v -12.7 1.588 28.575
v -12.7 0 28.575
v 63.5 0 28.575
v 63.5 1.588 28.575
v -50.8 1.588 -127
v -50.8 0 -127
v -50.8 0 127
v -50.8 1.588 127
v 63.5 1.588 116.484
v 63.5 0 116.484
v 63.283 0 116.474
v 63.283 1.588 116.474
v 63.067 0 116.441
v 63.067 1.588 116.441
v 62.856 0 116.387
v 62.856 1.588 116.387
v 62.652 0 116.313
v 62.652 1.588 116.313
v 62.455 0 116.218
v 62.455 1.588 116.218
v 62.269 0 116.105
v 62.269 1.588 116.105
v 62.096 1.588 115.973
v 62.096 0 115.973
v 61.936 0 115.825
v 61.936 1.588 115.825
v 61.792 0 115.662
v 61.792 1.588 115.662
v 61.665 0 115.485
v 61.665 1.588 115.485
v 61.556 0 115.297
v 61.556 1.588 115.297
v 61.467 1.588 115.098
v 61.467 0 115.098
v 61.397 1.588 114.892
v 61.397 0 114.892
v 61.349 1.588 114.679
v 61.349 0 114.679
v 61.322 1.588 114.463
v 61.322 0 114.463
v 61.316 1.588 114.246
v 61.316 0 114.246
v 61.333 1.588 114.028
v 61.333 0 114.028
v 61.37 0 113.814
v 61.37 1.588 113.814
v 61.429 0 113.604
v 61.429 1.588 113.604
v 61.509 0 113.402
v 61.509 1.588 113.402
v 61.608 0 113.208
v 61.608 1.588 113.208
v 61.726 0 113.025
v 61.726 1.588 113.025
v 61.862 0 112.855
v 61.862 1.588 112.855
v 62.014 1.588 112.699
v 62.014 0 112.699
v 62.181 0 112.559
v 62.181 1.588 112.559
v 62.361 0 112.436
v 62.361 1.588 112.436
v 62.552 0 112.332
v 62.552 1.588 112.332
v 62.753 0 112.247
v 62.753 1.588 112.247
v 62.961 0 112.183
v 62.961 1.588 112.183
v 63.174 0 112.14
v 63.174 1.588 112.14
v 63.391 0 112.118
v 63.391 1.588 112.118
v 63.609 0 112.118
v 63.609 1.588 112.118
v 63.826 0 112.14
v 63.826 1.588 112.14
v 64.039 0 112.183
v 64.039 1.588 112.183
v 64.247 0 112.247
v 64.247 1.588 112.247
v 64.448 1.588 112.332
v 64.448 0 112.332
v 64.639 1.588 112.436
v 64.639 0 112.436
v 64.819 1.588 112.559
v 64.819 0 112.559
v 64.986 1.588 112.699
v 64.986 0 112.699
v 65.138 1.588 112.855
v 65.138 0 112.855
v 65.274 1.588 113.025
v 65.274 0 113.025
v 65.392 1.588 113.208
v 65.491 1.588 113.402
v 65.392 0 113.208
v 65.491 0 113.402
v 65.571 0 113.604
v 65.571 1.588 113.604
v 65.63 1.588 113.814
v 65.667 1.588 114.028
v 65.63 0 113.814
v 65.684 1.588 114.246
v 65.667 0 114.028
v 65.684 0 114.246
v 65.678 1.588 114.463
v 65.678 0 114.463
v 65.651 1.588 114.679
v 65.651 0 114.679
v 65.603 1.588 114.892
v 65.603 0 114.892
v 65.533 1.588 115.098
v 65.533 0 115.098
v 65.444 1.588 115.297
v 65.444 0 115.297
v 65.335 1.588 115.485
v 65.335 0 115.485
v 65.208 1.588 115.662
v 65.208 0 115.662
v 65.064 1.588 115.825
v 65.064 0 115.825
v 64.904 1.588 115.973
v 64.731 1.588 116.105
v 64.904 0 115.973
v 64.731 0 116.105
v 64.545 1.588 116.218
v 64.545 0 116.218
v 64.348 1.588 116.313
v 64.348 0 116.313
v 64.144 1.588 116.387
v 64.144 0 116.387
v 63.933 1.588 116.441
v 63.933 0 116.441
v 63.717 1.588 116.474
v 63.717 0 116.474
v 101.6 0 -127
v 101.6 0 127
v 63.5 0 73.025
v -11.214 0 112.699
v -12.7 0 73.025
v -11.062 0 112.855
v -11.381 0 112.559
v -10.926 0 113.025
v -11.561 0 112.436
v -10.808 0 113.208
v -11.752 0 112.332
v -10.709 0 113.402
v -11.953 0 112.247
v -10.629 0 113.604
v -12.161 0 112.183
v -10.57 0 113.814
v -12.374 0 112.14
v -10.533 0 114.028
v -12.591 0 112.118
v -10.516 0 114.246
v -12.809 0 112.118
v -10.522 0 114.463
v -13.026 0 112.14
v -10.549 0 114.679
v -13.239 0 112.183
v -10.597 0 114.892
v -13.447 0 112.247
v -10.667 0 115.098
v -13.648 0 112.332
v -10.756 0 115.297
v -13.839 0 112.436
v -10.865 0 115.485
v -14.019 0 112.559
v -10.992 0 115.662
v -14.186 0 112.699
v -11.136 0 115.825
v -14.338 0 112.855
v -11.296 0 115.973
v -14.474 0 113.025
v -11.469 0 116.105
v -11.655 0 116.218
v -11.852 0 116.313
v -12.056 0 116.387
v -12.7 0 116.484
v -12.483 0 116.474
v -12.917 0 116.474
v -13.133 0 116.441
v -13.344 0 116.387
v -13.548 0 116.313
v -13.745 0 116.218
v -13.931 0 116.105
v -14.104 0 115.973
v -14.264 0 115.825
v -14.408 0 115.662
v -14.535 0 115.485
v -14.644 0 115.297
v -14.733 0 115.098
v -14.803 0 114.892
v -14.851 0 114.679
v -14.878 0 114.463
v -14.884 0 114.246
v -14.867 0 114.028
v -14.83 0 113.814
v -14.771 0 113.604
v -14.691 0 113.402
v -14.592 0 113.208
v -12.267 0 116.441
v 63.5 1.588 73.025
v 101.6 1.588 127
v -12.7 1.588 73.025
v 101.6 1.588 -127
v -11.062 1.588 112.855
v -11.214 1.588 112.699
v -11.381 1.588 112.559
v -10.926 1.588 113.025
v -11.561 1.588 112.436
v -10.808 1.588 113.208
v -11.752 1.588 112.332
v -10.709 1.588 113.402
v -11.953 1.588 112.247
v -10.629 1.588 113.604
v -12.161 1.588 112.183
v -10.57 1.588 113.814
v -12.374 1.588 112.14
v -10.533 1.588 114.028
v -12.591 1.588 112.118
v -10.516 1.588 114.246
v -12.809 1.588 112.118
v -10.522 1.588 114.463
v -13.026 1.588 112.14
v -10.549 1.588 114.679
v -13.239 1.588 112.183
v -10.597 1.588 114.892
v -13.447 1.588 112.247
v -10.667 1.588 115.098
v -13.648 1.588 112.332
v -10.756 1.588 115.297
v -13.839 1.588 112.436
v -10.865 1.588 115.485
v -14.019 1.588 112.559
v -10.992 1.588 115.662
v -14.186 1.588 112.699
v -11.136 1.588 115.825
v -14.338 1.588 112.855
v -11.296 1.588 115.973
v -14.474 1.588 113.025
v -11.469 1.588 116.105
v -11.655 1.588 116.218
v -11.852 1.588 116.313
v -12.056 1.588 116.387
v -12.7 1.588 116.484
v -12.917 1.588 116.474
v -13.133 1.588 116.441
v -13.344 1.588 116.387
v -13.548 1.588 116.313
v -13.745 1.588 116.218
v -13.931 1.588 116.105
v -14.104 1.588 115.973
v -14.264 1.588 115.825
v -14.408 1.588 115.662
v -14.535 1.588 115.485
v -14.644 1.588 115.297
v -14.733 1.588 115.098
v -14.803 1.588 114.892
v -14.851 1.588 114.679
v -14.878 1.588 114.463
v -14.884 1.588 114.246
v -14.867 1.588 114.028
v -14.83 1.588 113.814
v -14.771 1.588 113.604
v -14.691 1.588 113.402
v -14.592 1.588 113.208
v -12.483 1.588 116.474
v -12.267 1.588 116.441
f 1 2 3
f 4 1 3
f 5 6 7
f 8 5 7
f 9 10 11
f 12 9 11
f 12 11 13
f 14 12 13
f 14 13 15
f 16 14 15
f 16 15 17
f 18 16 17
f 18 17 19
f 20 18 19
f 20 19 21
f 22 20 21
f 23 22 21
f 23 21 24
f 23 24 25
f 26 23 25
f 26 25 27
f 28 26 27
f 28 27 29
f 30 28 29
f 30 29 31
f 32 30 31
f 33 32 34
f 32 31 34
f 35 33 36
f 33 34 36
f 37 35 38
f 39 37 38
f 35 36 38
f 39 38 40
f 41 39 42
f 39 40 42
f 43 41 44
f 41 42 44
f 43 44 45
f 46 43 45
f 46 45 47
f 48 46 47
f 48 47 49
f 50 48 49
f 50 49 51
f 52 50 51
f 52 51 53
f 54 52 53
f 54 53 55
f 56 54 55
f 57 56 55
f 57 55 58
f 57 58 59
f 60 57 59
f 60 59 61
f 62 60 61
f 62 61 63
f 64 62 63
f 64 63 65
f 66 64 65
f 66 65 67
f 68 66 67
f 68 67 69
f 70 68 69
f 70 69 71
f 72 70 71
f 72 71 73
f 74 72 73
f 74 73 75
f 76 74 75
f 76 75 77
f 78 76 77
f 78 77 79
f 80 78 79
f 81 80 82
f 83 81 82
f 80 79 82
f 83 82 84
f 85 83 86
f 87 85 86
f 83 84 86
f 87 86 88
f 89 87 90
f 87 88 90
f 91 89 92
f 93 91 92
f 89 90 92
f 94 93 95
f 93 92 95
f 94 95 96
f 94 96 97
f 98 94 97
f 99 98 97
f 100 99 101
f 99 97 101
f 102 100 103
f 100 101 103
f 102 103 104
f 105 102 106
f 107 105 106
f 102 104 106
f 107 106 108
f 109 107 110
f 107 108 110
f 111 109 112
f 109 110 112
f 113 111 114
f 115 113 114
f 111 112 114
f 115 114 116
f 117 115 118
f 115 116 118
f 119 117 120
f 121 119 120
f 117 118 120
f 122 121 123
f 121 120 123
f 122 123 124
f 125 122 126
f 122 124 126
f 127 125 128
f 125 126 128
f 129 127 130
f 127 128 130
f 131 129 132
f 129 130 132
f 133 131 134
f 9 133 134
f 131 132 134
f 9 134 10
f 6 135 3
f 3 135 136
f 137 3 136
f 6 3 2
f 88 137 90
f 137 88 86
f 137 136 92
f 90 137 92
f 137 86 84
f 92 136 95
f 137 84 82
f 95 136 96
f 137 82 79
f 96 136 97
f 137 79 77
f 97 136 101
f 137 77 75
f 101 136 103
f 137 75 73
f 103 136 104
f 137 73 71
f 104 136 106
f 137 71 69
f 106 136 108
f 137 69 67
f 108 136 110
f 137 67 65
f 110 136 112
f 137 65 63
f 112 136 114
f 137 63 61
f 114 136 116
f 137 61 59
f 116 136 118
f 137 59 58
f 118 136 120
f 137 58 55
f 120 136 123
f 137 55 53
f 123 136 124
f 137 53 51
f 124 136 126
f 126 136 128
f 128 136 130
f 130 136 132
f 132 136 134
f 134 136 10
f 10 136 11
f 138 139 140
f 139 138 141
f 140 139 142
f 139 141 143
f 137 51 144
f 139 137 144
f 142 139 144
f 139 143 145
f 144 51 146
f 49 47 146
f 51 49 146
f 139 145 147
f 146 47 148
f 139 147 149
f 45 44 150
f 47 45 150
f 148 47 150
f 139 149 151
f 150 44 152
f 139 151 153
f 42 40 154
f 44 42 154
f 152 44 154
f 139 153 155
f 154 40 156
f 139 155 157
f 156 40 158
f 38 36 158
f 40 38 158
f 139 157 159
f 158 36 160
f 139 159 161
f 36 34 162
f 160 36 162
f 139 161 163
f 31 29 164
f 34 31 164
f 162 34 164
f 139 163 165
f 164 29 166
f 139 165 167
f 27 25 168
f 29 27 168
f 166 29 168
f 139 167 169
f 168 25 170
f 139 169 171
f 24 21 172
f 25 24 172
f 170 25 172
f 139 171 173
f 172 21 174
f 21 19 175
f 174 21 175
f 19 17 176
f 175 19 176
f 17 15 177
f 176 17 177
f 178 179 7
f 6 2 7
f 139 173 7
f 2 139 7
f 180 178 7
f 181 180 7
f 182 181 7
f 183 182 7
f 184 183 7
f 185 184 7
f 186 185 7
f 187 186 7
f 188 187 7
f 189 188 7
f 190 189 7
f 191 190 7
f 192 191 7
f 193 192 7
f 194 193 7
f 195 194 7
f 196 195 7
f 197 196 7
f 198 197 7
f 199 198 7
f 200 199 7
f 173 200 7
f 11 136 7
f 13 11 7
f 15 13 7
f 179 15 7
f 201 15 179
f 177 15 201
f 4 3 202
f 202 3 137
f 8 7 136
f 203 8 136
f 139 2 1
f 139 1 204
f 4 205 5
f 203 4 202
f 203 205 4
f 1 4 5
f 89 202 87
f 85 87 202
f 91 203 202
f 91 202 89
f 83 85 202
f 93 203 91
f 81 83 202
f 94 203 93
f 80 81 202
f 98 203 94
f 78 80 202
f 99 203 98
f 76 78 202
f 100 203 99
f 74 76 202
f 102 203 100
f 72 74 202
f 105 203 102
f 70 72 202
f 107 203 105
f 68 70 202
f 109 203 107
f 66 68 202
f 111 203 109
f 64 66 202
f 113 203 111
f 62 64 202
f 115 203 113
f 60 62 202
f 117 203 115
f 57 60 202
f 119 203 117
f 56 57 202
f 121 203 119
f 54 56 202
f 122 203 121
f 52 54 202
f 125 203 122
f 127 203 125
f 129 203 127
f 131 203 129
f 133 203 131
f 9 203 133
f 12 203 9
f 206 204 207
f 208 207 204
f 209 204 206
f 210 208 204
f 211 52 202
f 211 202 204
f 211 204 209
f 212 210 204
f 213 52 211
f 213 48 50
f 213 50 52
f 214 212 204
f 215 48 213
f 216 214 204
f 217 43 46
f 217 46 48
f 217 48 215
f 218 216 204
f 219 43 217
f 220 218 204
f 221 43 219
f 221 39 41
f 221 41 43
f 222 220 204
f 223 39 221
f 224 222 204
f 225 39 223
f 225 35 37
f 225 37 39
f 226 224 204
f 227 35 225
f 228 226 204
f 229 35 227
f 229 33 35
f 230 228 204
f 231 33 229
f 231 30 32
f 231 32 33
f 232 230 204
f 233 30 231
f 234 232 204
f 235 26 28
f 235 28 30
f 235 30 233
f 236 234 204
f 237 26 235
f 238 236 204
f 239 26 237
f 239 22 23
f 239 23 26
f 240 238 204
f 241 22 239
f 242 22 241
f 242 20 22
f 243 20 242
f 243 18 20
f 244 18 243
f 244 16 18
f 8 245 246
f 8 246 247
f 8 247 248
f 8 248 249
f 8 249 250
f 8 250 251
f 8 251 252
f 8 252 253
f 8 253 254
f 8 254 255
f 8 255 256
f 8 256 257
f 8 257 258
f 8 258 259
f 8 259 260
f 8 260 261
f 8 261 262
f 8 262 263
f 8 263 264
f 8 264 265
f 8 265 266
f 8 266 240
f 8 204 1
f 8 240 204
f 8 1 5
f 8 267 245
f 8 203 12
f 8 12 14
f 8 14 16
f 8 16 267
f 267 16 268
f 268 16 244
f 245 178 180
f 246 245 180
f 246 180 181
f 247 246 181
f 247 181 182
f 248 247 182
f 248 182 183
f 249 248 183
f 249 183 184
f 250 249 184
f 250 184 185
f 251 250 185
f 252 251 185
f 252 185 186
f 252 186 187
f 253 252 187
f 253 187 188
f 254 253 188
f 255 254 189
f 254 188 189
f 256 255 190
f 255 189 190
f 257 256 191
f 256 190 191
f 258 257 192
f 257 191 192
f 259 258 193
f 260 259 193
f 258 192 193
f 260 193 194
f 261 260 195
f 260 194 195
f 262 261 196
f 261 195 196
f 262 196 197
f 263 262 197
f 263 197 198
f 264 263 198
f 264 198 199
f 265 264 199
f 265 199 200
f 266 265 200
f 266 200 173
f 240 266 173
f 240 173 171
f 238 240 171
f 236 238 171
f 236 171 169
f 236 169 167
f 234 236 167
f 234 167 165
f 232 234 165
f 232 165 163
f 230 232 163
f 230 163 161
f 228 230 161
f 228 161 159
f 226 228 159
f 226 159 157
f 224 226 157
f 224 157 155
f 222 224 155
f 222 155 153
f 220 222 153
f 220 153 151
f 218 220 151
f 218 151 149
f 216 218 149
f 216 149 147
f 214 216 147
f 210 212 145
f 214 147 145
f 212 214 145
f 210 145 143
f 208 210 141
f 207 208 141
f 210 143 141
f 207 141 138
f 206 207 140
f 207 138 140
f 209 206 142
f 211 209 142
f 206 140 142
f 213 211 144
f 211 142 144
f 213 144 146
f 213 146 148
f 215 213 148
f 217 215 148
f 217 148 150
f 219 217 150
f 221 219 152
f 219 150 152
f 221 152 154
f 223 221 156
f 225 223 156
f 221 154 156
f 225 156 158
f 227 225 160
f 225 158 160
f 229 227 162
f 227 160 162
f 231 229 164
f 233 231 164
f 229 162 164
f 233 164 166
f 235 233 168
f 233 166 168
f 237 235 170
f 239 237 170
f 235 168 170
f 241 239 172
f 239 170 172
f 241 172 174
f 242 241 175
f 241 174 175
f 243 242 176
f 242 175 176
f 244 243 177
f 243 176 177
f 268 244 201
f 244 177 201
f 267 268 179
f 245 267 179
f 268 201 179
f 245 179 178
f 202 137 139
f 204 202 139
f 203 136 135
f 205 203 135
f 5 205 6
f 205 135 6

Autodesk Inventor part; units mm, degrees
ref_plane "YZ Plane" through (0, 0, 0) normal (1, 0, 0) x (0, 1, 0)
ref_plane "XZ Plane" through (0, 0, 0) normal (0, 1, 0) x (-1, 0, 0)
ref_plane "XY Plane" through (0, 0, 0) normal (0, 0, 1) x (1, 0, 0)
sketch "Sketch1" plane through (0, 0, 0) normal (0, 1, 0) x (-1, 0, 0)
  line L0 (-101.6, -127) -> (50.8, -127)
  line L1 (50.8, -127) -> (50.8, 127)
  line L2 (50.8, 127) -> (-101.6, 127)
  line L3 (-101.6, 127) -> (-101.6, -127)
  point P0 (0, 0)
  dimension "d0" = 152.4
  dimension "d1" = 254
extrude "Extrusion2" add sketch "Sketch1" along normal blind 1.5875
sketch "Sketch3" plane through (0, 1.5875, 0) normal (0, 1, 0) x (1, 0, 0)
  circle A0 centre (63.5, -114.3) radius 2.1844
  circle A1 centre (-12.7, -114.3) radius 2.1844
  point P0 (0, 0)
  dimension "d13" = 4.3688
  dimension "d14" = 4.3688
hole "Hole1" at (63.5, 1.5875, 114.3) at (-12.7, 1.5875, 114.3) direction (0, -1, 0) diameter 4.3688 end through all
sketch "Sketch4" plane through (0, 0, 0) normal (0, -1, 0) x (1, 0, 0)
  line L0 (101.6, 127) -> (101.6, -127) projected
  line L1 (-50.8, -127) -> (-50.8, 127) projected
  line L2 (101.6, 50.8) -> (254, 50.8) construction
  line L3 (-12.7, 34.925) -> (-12.7, 66.675)
  line L4 (63.5, 66.675) -> (63.5, 34.925)
  line L5 (-12.7, 66.675) -> (-12.7, 69.85)
  line L6 (63.5, 73.025) -> (-12.7, 73.025)
  line L7 (-12.7, 73.025) -> (-12.7, 28.575)
  line L8 (-12.7, 28.575) -> (63.5, 28.575)
  line L9 (63.5, 28.575) -> (63.5, 73.025)
  point P0 (0, 0)
  point P1 (-12.7, 31.75)
  point P2 (63.5, 69.85)
  dimension "d24" = 76.2
  dimension "d25" = 38.1
extrude "Extrusion5" cut sketch "Sketch4" against normal up to next
properties part number "2polycarb10x6" material "Polycarbonate, Clear"
